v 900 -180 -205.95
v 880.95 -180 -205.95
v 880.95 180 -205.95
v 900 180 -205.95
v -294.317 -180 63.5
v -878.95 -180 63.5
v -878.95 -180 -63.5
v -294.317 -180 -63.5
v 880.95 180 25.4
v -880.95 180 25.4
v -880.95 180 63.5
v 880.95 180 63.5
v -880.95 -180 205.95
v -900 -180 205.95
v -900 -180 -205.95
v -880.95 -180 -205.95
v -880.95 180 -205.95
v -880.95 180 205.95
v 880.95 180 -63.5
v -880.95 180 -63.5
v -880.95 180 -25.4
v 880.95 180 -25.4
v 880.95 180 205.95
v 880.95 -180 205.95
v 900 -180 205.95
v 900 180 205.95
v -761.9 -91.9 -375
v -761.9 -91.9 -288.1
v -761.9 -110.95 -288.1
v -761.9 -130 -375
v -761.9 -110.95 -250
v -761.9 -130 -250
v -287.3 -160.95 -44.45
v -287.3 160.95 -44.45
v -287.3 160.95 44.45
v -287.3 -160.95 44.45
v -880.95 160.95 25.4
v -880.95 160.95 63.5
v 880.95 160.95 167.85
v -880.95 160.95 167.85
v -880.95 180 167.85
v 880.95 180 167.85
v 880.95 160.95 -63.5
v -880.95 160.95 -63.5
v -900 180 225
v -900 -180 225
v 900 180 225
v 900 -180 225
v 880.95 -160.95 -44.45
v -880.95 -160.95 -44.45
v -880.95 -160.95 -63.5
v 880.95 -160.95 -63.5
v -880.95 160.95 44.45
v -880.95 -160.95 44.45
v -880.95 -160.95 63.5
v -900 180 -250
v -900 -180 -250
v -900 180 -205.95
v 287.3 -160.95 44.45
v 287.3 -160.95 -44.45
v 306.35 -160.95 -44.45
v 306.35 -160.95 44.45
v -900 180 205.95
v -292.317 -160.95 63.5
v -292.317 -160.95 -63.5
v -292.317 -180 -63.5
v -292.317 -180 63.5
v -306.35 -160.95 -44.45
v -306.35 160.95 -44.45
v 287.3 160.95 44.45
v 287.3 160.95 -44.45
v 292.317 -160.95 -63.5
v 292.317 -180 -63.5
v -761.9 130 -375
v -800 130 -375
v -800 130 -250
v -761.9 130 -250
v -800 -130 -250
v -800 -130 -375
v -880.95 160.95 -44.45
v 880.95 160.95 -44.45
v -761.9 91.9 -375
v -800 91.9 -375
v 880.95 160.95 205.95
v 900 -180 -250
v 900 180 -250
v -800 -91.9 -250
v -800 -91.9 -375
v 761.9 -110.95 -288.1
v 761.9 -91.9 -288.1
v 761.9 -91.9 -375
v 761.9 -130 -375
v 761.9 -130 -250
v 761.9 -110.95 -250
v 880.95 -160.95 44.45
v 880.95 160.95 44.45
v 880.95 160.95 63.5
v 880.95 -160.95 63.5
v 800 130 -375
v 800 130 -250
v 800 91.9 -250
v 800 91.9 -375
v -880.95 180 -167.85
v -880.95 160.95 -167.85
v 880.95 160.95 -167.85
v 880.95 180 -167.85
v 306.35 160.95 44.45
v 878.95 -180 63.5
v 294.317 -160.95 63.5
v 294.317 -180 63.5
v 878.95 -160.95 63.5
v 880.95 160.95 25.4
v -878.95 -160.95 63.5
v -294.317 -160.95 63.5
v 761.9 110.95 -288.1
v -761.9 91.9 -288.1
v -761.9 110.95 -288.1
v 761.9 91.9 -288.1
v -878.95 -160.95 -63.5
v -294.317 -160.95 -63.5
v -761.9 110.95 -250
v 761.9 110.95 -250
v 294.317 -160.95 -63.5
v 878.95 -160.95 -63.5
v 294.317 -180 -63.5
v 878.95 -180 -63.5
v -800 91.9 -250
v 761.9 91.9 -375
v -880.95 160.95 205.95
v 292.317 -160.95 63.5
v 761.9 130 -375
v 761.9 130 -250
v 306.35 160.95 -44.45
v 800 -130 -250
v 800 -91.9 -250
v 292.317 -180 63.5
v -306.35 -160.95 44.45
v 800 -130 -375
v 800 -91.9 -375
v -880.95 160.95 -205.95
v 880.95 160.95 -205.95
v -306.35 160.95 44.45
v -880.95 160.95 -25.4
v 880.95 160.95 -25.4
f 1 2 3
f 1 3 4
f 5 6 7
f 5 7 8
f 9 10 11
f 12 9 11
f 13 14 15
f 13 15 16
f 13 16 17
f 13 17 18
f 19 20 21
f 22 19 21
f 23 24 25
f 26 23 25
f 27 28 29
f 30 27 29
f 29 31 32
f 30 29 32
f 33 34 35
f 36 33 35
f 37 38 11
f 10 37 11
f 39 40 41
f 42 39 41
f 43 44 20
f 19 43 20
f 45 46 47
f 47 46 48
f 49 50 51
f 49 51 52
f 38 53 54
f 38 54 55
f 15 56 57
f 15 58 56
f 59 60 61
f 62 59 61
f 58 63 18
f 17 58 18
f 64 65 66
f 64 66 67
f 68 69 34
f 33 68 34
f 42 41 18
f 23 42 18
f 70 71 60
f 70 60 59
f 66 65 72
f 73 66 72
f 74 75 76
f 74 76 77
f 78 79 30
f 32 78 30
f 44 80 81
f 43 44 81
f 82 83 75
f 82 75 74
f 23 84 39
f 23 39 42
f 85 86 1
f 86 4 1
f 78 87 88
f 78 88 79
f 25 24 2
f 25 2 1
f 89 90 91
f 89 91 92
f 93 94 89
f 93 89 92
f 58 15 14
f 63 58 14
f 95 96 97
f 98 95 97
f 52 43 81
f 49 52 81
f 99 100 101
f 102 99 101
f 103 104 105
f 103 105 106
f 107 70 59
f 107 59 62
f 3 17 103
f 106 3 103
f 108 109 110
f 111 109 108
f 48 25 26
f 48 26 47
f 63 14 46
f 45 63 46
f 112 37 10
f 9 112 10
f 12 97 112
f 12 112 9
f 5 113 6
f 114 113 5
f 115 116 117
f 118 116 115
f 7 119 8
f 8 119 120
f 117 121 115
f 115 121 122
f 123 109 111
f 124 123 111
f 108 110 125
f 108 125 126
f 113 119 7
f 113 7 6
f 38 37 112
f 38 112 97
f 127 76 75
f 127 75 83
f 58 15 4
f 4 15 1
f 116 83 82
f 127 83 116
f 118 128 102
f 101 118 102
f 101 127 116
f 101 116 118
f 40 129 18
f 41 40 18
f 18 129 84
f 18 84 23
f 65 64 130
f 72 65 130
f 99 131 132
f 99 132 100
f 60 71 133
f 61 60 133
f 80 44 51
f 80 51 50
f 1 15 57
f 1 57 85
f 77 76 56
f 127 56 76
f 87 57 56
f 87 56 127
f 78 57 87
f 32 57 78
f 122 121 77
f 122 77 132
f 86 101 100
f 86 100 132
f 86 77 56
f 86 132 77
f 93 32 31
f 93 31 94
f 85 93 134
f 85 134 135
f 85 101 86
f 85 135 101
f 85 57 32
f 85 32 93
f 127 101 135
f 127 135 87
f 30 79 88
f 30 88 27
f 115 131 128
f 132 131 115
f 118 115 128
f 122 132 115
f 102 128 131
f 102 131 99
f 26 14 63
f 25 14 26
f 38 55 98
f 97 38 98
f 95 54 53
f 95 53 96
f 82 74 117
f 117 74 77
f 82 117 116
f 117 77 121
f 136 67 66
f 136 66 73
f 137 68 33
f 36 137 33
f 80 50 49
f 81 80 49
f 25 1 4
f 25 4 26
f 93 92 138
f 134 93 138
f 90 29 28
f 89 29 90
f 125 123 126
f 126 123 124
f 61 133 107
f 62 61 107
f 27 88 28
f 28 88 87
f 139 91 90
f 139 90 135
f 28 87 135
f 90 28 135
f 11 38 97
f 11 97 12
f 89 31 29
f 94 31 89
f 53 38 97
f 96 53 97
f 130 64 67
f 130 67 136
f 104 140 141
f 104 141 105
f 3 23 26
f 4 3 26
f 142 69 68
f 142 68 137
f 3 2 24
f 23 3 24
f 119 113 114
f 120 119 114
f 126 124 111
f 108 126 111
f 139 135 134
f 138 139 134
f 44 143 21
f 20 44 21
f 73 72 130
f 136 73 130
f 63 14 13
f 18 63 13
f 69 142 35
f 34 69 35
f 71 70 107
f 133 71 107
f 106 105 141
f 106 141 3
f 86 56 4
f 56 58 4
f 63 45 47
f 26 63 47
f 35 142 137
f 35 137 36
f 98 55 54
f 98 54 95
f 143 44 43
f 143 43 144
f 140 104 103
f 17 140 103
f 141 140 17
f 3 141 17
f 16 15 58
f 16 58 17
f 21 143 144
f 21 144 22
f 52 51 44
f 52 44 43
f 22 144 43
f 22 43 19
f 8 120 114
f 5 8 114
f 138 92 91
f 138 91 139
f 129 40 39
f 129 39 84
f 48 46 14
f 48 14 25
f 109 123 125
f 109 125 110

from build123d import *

# Parameters (mm, degrees)
F0_W      = 1800
F0_H      = 19.05
F1_DEPTH  = 180
F2_W      = 19.05
F2_H      = 411.9
F3_DEPTH  = 360
F4_W      = 1761.9
F4_H      = 19.05
F5_DEPTH  = 340.95
F6_W      = 19.05
F6_H      = 38.1
F7_DEPTH  = 1761.9
F8_W      = 19.05
F8_H      = 88.9
F9_DEPTH  = 340.95
F10_W     = 1761.9
F10_H     = 127
F11_DEPTH = 19.05
F12_W     = 584.6333333333
F12_H     = 127
F13_DEPTH = 19.05
F14_DEPTH = 25
F15_W     = 38.1
F15_H     = 38.1
F16_DEPTH = 125
F17_W     = 1523.8
F17_H     = 19.05
F18_DEPTH = 38.1


with BuildPart() as f1:
    # F0 (on Front) → F1 (new body, symmetric)
    with BuildSketch(Plane.XZ):
        with Locations((0, 215.475)):
            Rectangle(F0_W, F0_H)
    extrude(amount=F1_DEPTH, both=True)


with BuildPart() as f1b:
    # F0 (on Front) → F1, piece 2 (new body, symmetric)
    with BuildSketch(Plane.XZ):
        with Locations((0, -215.475)):
            Rectangle(F0_W, F0_H)
    extrude(amount=F1_DEPTH, both=True)

    # F14 (add): a face of the model
    f14_faces = [f1b.faces().sort_by_distance(p)[0] for p in [
        (0, 0, -225),
    ]]
    extrude(f14_faces, amount=F14_DEPTH)

    # F15 (on face) → F16 (join)
    with BuildSketch(Plane(origin=(0, 0, -250), x_dir=(1, 0, 0), z_dir=(0, 0, -1))):
        with Locations((-780.95, 110.95)):
            Rectangle(F15_W, F15_H)
        with Locations((780.95, 110.95)):
            Rectangle(F15_W, F15_H)
        with Locations((-780.95, -110.95)):
            Rectangle(F15_W, F15_H)
        with Locations((780.95, -110.95)):
            Rectangle(F15_W, F15_H)
    extrude(amount=F16_DEPTH)

    # F17 (on face) → F18 (join)
    with BuildSketch(Plane(origin=(0, 0, -250), x_dir=(1, 0, 0), z_dir=(0, 0, -1))):
        with Locations((0, 101.425)):
            Rectangle(F17_W, F17_H)
        with Locations((0, -101.425)):
            Rectangle(F17_W, F17_H)
    extrude(amount=F18_DEPTH)


with BuildPart() as f3:
    # F2 (on face) → F3 (new body, through all)
    with BuildSketch(Plane.XZ.offset(180)):
        with Locations((-890.475, 0)):
            Rectangle(F2_W, F2_H)
    extrude(amount=-F3_DEPTH)


with BuildPart() as f3b:
    # F2 (on face) → F3, piece 2 (new body, through all)
    with BuildSketch(Plane.XZ.offset(180)):
        with Locations((890.475, 0)):
            Rectangle(F2_W, F2_H)
    extrude(amount=-F3_DEPTH)


with BuildPart() as f5:
    # F4 (on face) → F5 (new body)
    with BuildSketch(Plane.XZ.offset(180)):
        with Locations((0, 53.975)):
            Rectangle(F4_W, F4_H)
    extrude(amount=-F5_DEPTH)


with BuildPart() as f5b:
    # F4 (on face) → F5, piece 2 (new body)
    with BuildSketch(Plane.XZ.offset(180)):
        with Locations((0, -53.975)):
            Rectangle(F4_W, F4_H)
    extrude(amount=-F5_DEPTH)


with BuildPart() as f7:
    # F6 (on face) → F7 (new body, through all)
    with BuildSketch(Plane.YZ.offset(-880.95)):
        with Locations((170.475, 44.45)):
            Rectangle(F6_W, F6_H)
    extrude(amount=F7_DEPTH)


with BuildPart() as f7b:
    # F6 (on face) → F7, piece 2 (new body, through all)
    with BuildSketch(Plane.YZ.offset(-880.95)):
        with Locations((170.475, -44.45)):
            Rectangle(F6_W, F6_H)
    extrude(amount=F7_DEPTH)


with BuildPart() as f7c:
    # F6 (on face) → F7, piece 3 (new body, through all)
    with BuildSketch(Plane.YZ.offset(-880.95)):
        with Locations((170.475, 186.9)):
            Rectangle(F6_W, F6_H)
    extrude(amount=F7_DEPTH)


with BuildPart() as f7d:
    # F6 (on face) → F7, piece 4 (new body, through all)
    with BuildSketch(Plane.YZ.offset(-880.95)):
        with Locations((170.475, -186.9)):
            Rectangle(F6_W, F6_H)
    extrude(amount=F7_DEPTH)


with BuildPart() as f9:
    # F8 (on face) → F9 (new body, through all)
    with BuildSketch(Plane.XZ.offset(180)):
        with Locations((-296.825, 0)):
            Rectangle(F8_W, F8_H)
    extrude(amount=-F9_DEPTH)


with BuildPart() as f9b:
    # F8 (on face) → F9, piece 2 (new body, through all)
    with BuildSketch(Plane.XZ.offset(180)):
        with Locations((296.825, 0)):
            Rectangle(F8_W, F8_H)
    extrude(amount=-F9_DEPTH)


with BuildPart() as f11_tool:
    # F10 (on face) → F11 (new body)
    with BuildSketch(Plane.XZ.offset(180)):
        Rectangle(F10_W, F10_H)
    extrude(amount=-F11_DEPTH)


with BuildPart() as f5_1:
    add(f5.part)

    # F11: cut by f11_tool
    add(f11_tool.part, mode=Mode.SUBTRACT)


with BuildPart() as f5b_1:
    add(f5b.part)

    # F11: cut by f11_tool
    add(f11_tool.part, mode=Mode.SUBTRACT)


with BuildPart() as f9_1:
    add(f9.part)

    # F11: cut by f11_tool
    add(f11_tool.part, mode=Mode.SUBTRACT)


with BuildPart() as f9b_1:
    add(f9b.part)

    # F11: cut by f11_tool
    add(f11_tool.part, mode=Mode.SUBTRACT)


with BuildPart() as f13:
    # F12 (on face) → F13 (new body)
    with BuildSketch(Plane.XZ.offset(160.95)):
        with Locations((-586.6333333333, 0)):
            Rectangle(F12_W, F12_H)
    extrude(amount=F13_DEPTH)


with BuildPart() as f13b:
    # F12 (on face) → F13, piece 2 (new body)
    with BuildSketch(Plane.XZ.offset(160.95)):
        Rectangle(F12_W, F12_H)
    extrude(amount=F13_DEPTH)


with BuildPart() as f13c:
    # F12 (on face) → F13, piece 3 (new body)
    with BuildSketch(Plane.XZ.offset(160.95)):
        with Locations((586.6333333333, 0)):
            Rectangle(F12_W, F12_H)
    extrude(amount=F13_DEPTH)


solid = Compound([f1.part, f1b.part, f3.part, f3b.part, f7.part, f7b.part, f7c.part, f7d.part, f5_1.part, f5b_1.part, f9_1.part, f9b_1.part, f13.part, f13b.part, f13c.part])
